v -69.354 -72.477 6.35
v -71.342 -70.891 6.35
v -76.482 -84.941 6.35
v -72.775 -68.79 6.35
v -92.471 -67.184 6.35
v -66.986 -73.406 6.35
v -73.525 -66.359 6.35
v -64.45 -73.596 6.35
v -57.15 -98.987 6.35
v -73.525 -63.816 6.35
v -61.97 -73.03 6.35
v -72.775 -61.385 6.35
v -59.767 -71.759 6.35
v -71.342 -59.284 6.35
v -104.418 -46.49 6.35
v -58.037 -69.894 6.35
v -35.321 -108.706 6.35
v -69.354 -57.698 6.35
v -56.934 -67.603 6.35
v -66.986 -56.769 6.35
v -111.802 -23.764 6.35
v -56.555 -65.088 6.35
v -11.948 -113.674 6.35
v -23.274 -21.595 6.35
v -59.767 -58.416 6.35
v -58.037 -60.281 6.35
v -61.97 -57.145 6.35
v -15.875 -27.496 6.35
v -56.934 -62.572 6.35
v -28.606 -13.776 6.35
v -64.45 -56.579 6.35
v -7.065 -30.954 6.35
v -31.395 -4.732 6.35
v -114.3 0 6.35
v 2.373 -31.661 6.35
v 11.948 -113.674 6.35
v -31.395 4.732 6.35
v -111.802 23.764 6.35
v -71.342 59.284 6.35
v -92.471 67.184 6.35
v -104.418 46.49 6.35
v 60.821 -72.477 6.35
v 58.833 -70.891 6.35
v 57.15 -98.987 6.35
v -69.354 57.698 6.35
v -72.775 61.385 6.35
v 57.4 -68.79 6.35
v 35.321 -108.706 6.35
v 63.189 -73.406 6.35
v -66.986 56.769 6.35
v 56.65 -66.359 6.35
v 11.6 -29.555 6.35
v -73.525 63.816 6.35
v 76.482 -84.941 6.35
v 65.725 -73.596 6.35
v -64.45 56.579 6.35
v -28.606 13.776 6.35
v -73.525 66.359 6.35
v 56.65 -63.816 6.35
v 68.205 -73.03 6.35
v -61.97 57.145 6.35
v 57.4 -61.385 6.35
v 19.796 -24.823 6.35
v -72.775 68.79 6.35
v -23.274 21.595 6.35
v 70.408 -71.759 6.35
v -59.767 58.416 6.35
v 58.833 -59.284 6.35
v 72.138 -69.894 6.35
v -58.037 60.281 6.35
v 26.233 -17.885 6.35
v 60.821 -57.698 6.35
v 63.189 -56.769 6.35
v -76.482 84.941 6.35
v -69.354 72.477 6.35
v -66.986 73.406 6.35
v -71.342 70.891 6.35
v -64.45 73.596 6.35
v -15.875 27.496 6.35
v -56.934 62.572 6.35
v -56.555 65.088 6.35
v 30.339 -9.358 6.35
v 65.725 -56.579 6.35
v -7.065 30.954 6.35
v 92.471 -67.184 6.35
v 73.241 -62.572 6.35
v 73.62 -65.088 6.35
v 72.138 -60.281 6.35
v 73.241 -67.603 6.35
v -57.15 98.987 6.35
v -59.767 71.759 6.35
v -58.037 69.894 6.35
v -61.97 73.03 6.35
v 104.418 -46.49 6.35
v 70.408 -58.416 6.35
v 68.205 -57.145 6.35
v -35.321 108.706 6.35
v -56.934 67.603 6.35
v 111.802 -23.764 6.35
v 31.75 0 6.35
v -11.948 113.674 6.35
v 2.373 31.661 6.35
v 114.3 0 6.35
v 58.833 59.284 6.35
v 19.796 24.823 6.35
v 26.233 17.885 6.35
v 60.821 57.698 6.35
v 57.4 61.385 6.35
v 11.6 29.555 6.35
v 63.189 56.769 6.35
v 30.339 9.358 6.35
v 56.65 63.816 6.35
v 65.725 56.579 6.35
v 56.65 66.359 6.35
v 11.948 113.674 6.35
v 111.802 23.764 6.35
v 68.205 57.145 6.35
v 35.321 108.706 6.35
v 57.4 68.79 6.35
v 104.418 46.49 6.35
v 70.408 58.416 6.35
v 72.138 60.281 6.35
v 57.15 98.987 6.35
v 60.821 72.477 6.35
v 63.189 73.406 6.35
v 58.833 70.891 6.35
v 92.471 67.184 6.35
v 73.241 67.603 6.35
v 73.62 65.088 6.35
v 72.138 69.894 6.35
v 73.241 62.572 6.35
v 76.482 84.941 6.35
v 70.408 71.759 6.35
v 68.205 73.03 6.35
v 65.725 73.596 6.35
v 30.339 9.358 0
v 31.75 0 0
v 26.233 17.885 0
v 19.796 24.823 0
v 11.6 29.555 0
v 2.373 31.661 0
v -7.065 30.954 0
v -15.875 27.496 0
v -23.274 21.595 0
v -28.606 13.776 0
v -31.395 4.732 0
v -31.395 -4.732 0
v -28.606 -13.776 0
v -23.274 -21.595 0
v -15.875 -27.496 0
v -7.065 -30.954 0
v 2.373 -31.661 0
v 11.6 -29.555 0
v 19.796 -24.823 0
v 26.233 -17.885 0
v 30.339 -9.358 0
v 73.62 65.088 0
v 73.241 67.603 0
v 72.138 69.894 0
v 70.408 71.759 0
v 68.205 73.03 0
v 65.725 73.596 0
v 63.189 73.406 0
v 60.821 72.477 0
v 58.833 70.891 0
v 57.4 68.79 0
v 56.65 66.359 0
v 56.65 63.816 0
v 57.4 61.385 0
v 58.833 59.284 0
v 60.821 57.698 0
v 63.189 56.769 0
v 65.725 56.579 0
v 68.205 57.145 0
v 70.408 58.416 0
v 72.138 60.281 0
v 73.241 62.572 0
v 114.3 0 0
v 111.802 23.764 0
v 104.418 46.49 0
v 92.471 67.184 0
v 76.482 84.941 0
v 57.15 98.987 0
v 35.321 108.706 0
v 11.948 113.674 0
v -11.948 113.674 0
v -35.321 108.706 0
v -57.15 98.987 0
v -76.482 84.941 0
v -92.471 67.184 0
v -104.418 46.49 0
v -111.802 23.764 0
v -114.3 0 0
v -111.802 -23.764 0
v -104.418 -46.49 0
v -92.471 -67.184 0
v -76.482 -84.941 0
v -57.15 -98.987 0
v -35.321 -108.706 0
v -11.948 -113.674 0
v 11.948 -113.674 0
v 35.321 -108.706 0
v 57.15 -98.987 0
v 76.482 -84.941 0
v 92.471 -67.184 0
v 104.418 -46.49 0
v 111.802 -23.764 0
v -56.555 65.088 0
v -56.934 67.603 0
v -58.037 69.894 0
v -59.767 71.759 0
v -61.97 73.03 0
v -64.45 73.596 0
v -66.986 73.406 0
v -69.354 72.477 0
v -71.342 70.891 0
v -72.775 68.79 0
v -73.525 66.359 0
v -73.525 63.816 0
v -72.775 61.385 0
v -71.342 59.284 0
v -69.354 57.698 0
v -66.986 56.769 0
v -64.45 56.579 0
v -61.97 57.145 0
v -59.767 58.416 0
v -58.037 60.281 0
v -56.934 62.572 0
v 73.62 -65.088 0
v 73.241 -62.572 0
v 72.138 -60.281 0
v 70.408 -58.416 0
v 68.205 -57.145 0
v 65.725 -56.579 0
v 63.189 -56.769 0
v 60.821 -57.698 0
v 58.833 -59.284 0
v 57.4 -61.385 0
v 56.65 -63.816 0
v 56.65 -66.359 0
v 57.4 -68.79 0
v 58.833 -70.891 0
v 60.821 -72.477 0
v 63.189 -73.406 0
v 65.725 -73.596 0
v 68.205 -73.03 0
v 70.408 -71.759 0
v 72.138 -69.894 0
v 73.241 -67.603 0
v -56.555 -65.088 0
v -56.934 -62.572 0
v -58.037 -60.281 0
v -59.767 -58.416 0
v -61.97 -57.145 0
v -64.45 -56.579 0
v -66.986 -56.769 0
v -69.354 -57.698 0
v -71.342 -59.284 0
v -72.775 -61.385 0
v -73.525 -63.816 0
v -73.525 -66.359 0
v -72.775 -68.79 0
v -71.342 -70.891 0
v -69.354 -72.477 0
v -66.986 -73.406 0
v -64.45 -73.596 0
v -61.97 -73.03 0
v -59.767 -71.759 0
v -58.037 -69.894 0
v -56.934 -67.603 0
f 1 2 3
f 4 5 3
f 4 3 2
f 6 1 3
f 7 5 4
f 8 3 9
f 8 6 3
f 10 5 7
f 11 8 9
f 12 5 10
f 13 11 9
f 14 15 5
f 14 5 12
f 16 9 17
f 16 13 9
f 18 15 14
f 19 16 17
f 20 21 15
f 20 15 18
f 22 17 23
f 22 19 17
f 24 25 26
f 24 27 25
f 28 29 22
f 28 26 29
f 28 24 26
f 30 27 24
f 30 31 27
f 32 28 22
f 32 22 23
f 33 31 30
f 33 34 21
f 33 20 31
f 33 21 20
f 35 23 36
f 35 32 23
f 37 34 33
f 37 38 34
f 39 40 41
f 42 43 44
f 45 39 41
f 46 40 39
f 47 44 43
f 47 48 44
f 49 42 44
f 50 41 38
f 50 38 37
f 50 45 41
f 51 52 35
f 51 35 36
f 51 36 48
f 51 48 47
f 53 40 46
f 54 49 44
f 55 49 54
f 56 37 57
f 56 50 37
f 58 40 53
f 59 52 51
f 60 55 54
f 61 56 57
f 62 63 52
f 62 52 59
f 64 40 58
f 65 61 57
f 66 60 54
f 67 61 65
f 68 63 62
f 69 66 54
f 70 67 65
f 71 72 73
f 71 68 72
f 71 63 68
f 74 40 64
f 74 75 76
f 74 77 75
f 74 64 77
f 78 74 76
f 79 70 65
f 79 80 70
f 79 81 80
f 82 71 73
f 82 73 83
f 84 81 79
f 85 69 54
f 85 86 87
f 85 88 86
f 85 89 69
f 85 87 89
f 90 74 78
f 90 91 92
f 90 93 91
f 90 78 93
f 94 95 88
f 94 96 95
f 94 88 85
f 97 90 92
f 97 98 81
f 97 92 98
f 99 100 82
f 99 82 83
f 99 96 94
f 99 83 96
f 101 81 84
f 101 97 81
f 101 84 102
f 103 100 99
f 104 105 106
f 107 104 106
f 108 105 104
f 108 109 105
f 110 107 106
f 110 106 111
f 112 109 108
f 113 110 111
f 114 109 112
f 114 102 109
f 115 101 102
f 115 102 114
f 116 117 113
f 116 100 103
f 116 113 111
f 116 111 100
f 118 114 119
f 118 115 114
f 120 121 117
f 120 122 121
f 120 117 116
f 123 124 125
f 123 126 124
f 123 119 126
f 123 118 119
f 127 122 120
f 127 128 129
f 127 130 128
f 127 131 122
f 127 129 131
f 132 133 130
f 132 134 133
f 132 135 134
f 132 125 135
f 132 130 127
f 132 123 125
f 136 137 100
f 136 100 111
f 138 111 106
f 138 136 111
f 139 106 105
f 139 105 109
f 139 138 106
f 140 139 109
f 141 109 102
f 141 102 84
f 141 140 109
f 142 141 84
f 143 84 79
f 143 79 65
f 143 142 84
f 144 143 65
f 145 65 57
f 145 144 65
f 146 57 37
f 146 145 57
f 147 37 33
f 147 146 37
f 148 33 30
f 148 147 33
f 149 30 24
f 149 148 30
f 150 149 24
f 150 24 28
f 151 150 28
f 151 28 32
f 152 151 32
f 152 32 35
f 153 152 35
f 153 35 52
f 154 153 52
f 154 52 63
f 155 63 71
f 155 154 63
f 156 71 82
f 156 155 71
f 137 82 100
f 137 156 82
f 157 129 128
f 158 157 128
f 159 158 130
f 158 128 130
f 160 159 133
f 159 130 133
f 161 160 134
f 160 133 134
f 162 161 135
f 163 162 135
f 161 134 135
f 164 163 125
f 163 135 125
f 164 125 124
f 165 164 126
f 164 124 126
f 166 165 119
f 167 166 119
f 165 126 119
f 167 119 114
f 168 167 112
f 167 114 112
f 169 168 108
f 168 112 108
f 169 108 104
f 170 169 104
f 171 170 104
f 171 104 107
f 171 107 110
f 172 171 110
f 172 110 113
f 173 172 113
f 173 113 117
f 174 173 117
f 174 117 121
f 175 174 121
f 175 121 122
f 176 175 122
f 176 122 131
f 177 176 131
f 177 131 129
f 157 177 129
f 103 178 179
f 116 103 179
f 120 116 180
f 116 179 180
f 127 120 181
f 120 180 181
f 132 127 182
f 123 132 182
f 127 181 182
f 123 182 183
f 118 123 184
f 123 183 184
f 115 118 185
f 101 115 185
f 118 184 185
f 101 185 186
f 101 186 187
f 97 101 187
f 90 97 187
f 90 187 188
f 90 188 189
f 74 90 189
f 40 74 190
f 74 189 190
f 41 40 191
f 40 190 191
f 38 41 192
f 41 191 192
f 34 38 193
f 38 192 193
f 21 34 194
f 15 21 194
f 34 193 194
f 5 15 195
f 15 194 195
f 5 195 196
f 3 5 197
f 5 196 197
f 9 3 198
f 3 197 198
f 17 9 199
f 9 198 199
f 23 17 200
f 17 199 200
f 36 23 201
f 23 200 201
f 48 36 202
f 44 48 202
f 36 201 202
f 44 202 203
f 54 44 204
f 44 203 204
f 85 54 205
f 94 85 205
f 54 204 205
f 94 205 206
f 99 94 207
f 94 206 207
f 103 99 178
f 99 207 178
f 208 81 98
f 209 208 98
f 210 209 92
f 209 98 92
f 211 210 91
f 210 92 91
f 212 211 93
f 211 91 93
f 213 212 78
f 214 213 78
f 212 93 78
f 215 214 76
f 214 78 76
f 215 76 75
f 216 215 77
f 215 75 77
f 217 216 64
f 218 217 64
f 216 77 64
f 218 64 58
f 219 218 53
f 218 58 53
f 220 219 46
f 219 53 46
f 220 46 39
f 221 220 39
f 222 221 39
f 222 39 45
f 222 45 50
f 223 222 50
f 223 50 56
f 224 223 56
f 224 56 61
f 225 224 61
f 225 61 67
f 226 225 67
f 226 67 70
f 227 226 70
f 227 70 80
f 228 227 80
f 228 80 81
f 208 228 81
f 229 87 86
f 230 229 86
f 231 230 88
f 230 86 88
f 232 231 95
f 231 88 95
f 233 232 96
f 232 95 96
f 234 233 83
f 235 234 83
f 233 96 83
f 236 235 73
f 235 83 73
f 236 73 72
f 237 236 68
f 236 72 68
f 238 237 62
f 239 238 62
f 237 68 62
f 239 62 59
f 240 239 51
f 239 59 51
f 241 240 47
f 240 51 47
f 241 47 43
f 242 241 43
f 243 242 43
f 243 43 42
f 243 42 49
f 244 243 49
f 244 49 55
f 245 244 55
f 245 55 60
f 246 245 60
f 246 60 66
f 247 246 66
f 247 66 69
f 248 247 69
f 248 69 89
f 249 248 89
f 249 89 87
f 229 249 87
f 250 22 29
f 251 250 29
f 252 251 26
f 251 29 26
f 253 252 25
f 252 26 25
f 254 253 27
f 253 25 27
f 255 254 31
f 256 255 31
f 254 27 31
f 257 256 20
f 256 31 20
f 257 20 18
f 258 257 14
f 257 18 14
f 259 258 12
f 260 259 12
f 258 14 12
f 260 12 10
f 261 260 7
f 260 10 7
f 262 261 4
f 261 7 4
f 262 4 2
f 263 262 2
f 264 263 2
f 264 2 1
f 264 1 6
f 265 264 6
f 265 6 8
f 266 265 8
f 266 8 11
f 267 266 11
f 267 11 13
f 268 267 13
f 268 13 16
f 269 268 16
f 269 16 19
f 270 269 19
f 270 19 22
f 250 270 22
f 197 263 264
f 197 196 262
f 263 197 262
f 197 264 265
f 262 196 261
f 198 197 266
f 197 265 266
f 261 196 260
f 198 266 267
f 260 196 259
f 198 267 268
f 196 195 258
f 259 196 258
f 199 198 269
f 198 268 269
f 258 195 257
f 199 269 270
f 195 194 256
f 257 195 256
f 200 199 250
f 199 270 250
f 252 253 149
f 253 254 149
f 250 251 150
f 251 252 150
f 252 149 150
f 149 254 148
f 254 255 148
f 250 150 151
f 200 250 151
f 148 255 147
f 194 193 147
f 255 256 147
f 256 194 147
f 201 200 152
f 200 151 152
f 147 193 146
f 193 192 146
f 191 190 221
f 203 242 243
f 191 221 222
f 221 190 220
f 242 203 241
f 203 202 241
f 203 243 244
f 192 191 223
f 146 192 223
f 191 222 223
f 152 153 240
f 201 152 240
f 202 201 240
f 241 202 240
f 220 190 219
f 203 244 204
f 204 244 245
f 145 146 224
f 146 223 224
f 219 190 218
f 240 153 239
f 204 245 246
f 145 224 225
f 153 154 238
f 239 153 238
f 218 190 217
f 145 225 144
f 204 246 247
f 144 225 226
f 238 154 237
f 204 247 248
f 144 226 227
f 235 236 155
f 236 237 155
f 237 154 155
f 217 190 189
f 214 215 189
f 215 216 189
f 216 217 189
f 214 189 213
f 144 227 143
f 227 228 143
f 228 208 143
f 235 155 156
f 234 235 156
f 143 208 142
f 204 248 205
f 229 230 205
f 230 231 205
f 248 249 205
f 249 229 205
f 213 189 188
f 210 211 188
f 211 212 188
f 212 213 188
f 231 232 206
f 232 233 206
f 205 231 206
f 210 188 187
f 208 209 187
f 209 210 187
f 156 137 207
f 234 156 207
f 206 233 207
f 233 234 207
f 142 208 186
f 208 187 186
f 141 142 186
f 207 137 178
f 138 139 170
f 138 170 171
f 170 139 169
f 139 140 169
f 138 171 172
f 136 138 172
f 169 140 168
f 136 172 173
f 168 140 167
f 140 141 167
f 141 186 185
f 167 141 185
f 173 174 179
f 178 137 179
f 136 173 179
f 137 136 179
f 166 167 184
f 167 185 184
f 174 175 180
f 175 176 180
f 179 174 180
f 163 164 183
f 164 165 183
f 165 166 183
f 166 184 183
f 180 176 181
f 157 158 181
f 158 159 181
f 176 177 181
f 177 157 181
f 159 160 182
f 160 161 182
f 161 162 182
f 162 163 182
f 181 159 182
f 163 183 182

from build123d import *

# Parameters (mm, degrees)
SKETCH2_R          = 114.3
SKETCH2_R_2        = 31.75
EXTRUDE1_DEPTH     = 6.35
CUT_EXTRUDE1_REACH = 163.769
SKETCH3_R          = 8.5328125


with BuildPart() as part:
    # Sketch2 → Extrude1 (new body)
    with BuildSketch(Plane.XY):
        Circle(SKETCH2_R)
        Circle(SKETCH2_R_2, mode=Mode.SUBTRACT)
    extrude(amount=EXTRUDE1_DEPTH)

    # Sketch3 → Cut-Extrude1 (cut, up to next)
    with BuildSketch(Plane.XY.offset(6.35), mode=Mode.PRIVATE) as cut_extrude1_sk1:
        with Locations((-65.0875, -65.0875)):
            Circle(SKETCH3_R)
    cut_extrude1_tool1 = extrude(cut_extrude1_sk1.sketch, amount=-CUT_EXTRUDE1_REACH, mode=Mode.PRIVATE) & part.part
    # Sketch3 → Cut-Extrude1 (cut, up to next)
    with BuildSketch(Plane.XY.offset(6.35), mode=Mode.PRIVATE) as cut_extrude1_sk2:
        with Locations((-65.0875, 65.0875)):
            Circle(SKETCH3_R)
    cut_extrude1_tool2 = extrude(cut_extrude1_sk2.sketch, amount=-CUT_EXTRUDE1_REACH, mode=Mode.PRIVATE) & part.part
    # Sketch3 → Cut-Extrude1 (cut, up to next)
    with BuildSketch(Plane.XY.offset(6.35), mode=Mode.PRIVATE) as cut_extrude1_sk3:
        with Locations((65.0875, 65.0875)):
            Circle(SKETCH3_R)
    cut_extrude1_tool3 = extrude(cut_extrude1_sk3.sketch, amount=-CUT_EXTRUDE1_REACH, mode=Mode.PRIVATE) & part.part
    # Sketch3 → Cut-Extrude1 (cut, up to next)
    with BuildSketch(Plane.XY.offset(6.35), mode=Mode.PRIVATE) as cut_extrude1_sk4:
        with Locations((65.0875, -65.0875)):
            Circle(SKETCH3_R)
    cut_extrude1_tool4 = extrude(cut_extrude1_sk4.sketch, amount=-CUT_EXTRUDE1_REACH, mode=Mode.PRIVATE) & part.part
    add(cut_extrude1_tool1.solids().sort_by_distance((-65.0875, -65.0875, 6.35))[0], mode=Mode.SUBTRACT)
    add(cut_extrude1_tool2.solids().sort_by_distance((-65.0875, 65.0875, 6.35))[0], mode=Mode.SUBTRACT)
    add(cut_extrude1_tool3.solids().sort_by_distance((65.0875, 65.0875, 6.35))[0], mode=Mode.SUBTRACT)
    add(cut_extrude1_tool4.solids().sort_by_distance((65.0875, -65.0875, 6.35))[0], mode=Mode.SUBTRACT)


solid = part.part
